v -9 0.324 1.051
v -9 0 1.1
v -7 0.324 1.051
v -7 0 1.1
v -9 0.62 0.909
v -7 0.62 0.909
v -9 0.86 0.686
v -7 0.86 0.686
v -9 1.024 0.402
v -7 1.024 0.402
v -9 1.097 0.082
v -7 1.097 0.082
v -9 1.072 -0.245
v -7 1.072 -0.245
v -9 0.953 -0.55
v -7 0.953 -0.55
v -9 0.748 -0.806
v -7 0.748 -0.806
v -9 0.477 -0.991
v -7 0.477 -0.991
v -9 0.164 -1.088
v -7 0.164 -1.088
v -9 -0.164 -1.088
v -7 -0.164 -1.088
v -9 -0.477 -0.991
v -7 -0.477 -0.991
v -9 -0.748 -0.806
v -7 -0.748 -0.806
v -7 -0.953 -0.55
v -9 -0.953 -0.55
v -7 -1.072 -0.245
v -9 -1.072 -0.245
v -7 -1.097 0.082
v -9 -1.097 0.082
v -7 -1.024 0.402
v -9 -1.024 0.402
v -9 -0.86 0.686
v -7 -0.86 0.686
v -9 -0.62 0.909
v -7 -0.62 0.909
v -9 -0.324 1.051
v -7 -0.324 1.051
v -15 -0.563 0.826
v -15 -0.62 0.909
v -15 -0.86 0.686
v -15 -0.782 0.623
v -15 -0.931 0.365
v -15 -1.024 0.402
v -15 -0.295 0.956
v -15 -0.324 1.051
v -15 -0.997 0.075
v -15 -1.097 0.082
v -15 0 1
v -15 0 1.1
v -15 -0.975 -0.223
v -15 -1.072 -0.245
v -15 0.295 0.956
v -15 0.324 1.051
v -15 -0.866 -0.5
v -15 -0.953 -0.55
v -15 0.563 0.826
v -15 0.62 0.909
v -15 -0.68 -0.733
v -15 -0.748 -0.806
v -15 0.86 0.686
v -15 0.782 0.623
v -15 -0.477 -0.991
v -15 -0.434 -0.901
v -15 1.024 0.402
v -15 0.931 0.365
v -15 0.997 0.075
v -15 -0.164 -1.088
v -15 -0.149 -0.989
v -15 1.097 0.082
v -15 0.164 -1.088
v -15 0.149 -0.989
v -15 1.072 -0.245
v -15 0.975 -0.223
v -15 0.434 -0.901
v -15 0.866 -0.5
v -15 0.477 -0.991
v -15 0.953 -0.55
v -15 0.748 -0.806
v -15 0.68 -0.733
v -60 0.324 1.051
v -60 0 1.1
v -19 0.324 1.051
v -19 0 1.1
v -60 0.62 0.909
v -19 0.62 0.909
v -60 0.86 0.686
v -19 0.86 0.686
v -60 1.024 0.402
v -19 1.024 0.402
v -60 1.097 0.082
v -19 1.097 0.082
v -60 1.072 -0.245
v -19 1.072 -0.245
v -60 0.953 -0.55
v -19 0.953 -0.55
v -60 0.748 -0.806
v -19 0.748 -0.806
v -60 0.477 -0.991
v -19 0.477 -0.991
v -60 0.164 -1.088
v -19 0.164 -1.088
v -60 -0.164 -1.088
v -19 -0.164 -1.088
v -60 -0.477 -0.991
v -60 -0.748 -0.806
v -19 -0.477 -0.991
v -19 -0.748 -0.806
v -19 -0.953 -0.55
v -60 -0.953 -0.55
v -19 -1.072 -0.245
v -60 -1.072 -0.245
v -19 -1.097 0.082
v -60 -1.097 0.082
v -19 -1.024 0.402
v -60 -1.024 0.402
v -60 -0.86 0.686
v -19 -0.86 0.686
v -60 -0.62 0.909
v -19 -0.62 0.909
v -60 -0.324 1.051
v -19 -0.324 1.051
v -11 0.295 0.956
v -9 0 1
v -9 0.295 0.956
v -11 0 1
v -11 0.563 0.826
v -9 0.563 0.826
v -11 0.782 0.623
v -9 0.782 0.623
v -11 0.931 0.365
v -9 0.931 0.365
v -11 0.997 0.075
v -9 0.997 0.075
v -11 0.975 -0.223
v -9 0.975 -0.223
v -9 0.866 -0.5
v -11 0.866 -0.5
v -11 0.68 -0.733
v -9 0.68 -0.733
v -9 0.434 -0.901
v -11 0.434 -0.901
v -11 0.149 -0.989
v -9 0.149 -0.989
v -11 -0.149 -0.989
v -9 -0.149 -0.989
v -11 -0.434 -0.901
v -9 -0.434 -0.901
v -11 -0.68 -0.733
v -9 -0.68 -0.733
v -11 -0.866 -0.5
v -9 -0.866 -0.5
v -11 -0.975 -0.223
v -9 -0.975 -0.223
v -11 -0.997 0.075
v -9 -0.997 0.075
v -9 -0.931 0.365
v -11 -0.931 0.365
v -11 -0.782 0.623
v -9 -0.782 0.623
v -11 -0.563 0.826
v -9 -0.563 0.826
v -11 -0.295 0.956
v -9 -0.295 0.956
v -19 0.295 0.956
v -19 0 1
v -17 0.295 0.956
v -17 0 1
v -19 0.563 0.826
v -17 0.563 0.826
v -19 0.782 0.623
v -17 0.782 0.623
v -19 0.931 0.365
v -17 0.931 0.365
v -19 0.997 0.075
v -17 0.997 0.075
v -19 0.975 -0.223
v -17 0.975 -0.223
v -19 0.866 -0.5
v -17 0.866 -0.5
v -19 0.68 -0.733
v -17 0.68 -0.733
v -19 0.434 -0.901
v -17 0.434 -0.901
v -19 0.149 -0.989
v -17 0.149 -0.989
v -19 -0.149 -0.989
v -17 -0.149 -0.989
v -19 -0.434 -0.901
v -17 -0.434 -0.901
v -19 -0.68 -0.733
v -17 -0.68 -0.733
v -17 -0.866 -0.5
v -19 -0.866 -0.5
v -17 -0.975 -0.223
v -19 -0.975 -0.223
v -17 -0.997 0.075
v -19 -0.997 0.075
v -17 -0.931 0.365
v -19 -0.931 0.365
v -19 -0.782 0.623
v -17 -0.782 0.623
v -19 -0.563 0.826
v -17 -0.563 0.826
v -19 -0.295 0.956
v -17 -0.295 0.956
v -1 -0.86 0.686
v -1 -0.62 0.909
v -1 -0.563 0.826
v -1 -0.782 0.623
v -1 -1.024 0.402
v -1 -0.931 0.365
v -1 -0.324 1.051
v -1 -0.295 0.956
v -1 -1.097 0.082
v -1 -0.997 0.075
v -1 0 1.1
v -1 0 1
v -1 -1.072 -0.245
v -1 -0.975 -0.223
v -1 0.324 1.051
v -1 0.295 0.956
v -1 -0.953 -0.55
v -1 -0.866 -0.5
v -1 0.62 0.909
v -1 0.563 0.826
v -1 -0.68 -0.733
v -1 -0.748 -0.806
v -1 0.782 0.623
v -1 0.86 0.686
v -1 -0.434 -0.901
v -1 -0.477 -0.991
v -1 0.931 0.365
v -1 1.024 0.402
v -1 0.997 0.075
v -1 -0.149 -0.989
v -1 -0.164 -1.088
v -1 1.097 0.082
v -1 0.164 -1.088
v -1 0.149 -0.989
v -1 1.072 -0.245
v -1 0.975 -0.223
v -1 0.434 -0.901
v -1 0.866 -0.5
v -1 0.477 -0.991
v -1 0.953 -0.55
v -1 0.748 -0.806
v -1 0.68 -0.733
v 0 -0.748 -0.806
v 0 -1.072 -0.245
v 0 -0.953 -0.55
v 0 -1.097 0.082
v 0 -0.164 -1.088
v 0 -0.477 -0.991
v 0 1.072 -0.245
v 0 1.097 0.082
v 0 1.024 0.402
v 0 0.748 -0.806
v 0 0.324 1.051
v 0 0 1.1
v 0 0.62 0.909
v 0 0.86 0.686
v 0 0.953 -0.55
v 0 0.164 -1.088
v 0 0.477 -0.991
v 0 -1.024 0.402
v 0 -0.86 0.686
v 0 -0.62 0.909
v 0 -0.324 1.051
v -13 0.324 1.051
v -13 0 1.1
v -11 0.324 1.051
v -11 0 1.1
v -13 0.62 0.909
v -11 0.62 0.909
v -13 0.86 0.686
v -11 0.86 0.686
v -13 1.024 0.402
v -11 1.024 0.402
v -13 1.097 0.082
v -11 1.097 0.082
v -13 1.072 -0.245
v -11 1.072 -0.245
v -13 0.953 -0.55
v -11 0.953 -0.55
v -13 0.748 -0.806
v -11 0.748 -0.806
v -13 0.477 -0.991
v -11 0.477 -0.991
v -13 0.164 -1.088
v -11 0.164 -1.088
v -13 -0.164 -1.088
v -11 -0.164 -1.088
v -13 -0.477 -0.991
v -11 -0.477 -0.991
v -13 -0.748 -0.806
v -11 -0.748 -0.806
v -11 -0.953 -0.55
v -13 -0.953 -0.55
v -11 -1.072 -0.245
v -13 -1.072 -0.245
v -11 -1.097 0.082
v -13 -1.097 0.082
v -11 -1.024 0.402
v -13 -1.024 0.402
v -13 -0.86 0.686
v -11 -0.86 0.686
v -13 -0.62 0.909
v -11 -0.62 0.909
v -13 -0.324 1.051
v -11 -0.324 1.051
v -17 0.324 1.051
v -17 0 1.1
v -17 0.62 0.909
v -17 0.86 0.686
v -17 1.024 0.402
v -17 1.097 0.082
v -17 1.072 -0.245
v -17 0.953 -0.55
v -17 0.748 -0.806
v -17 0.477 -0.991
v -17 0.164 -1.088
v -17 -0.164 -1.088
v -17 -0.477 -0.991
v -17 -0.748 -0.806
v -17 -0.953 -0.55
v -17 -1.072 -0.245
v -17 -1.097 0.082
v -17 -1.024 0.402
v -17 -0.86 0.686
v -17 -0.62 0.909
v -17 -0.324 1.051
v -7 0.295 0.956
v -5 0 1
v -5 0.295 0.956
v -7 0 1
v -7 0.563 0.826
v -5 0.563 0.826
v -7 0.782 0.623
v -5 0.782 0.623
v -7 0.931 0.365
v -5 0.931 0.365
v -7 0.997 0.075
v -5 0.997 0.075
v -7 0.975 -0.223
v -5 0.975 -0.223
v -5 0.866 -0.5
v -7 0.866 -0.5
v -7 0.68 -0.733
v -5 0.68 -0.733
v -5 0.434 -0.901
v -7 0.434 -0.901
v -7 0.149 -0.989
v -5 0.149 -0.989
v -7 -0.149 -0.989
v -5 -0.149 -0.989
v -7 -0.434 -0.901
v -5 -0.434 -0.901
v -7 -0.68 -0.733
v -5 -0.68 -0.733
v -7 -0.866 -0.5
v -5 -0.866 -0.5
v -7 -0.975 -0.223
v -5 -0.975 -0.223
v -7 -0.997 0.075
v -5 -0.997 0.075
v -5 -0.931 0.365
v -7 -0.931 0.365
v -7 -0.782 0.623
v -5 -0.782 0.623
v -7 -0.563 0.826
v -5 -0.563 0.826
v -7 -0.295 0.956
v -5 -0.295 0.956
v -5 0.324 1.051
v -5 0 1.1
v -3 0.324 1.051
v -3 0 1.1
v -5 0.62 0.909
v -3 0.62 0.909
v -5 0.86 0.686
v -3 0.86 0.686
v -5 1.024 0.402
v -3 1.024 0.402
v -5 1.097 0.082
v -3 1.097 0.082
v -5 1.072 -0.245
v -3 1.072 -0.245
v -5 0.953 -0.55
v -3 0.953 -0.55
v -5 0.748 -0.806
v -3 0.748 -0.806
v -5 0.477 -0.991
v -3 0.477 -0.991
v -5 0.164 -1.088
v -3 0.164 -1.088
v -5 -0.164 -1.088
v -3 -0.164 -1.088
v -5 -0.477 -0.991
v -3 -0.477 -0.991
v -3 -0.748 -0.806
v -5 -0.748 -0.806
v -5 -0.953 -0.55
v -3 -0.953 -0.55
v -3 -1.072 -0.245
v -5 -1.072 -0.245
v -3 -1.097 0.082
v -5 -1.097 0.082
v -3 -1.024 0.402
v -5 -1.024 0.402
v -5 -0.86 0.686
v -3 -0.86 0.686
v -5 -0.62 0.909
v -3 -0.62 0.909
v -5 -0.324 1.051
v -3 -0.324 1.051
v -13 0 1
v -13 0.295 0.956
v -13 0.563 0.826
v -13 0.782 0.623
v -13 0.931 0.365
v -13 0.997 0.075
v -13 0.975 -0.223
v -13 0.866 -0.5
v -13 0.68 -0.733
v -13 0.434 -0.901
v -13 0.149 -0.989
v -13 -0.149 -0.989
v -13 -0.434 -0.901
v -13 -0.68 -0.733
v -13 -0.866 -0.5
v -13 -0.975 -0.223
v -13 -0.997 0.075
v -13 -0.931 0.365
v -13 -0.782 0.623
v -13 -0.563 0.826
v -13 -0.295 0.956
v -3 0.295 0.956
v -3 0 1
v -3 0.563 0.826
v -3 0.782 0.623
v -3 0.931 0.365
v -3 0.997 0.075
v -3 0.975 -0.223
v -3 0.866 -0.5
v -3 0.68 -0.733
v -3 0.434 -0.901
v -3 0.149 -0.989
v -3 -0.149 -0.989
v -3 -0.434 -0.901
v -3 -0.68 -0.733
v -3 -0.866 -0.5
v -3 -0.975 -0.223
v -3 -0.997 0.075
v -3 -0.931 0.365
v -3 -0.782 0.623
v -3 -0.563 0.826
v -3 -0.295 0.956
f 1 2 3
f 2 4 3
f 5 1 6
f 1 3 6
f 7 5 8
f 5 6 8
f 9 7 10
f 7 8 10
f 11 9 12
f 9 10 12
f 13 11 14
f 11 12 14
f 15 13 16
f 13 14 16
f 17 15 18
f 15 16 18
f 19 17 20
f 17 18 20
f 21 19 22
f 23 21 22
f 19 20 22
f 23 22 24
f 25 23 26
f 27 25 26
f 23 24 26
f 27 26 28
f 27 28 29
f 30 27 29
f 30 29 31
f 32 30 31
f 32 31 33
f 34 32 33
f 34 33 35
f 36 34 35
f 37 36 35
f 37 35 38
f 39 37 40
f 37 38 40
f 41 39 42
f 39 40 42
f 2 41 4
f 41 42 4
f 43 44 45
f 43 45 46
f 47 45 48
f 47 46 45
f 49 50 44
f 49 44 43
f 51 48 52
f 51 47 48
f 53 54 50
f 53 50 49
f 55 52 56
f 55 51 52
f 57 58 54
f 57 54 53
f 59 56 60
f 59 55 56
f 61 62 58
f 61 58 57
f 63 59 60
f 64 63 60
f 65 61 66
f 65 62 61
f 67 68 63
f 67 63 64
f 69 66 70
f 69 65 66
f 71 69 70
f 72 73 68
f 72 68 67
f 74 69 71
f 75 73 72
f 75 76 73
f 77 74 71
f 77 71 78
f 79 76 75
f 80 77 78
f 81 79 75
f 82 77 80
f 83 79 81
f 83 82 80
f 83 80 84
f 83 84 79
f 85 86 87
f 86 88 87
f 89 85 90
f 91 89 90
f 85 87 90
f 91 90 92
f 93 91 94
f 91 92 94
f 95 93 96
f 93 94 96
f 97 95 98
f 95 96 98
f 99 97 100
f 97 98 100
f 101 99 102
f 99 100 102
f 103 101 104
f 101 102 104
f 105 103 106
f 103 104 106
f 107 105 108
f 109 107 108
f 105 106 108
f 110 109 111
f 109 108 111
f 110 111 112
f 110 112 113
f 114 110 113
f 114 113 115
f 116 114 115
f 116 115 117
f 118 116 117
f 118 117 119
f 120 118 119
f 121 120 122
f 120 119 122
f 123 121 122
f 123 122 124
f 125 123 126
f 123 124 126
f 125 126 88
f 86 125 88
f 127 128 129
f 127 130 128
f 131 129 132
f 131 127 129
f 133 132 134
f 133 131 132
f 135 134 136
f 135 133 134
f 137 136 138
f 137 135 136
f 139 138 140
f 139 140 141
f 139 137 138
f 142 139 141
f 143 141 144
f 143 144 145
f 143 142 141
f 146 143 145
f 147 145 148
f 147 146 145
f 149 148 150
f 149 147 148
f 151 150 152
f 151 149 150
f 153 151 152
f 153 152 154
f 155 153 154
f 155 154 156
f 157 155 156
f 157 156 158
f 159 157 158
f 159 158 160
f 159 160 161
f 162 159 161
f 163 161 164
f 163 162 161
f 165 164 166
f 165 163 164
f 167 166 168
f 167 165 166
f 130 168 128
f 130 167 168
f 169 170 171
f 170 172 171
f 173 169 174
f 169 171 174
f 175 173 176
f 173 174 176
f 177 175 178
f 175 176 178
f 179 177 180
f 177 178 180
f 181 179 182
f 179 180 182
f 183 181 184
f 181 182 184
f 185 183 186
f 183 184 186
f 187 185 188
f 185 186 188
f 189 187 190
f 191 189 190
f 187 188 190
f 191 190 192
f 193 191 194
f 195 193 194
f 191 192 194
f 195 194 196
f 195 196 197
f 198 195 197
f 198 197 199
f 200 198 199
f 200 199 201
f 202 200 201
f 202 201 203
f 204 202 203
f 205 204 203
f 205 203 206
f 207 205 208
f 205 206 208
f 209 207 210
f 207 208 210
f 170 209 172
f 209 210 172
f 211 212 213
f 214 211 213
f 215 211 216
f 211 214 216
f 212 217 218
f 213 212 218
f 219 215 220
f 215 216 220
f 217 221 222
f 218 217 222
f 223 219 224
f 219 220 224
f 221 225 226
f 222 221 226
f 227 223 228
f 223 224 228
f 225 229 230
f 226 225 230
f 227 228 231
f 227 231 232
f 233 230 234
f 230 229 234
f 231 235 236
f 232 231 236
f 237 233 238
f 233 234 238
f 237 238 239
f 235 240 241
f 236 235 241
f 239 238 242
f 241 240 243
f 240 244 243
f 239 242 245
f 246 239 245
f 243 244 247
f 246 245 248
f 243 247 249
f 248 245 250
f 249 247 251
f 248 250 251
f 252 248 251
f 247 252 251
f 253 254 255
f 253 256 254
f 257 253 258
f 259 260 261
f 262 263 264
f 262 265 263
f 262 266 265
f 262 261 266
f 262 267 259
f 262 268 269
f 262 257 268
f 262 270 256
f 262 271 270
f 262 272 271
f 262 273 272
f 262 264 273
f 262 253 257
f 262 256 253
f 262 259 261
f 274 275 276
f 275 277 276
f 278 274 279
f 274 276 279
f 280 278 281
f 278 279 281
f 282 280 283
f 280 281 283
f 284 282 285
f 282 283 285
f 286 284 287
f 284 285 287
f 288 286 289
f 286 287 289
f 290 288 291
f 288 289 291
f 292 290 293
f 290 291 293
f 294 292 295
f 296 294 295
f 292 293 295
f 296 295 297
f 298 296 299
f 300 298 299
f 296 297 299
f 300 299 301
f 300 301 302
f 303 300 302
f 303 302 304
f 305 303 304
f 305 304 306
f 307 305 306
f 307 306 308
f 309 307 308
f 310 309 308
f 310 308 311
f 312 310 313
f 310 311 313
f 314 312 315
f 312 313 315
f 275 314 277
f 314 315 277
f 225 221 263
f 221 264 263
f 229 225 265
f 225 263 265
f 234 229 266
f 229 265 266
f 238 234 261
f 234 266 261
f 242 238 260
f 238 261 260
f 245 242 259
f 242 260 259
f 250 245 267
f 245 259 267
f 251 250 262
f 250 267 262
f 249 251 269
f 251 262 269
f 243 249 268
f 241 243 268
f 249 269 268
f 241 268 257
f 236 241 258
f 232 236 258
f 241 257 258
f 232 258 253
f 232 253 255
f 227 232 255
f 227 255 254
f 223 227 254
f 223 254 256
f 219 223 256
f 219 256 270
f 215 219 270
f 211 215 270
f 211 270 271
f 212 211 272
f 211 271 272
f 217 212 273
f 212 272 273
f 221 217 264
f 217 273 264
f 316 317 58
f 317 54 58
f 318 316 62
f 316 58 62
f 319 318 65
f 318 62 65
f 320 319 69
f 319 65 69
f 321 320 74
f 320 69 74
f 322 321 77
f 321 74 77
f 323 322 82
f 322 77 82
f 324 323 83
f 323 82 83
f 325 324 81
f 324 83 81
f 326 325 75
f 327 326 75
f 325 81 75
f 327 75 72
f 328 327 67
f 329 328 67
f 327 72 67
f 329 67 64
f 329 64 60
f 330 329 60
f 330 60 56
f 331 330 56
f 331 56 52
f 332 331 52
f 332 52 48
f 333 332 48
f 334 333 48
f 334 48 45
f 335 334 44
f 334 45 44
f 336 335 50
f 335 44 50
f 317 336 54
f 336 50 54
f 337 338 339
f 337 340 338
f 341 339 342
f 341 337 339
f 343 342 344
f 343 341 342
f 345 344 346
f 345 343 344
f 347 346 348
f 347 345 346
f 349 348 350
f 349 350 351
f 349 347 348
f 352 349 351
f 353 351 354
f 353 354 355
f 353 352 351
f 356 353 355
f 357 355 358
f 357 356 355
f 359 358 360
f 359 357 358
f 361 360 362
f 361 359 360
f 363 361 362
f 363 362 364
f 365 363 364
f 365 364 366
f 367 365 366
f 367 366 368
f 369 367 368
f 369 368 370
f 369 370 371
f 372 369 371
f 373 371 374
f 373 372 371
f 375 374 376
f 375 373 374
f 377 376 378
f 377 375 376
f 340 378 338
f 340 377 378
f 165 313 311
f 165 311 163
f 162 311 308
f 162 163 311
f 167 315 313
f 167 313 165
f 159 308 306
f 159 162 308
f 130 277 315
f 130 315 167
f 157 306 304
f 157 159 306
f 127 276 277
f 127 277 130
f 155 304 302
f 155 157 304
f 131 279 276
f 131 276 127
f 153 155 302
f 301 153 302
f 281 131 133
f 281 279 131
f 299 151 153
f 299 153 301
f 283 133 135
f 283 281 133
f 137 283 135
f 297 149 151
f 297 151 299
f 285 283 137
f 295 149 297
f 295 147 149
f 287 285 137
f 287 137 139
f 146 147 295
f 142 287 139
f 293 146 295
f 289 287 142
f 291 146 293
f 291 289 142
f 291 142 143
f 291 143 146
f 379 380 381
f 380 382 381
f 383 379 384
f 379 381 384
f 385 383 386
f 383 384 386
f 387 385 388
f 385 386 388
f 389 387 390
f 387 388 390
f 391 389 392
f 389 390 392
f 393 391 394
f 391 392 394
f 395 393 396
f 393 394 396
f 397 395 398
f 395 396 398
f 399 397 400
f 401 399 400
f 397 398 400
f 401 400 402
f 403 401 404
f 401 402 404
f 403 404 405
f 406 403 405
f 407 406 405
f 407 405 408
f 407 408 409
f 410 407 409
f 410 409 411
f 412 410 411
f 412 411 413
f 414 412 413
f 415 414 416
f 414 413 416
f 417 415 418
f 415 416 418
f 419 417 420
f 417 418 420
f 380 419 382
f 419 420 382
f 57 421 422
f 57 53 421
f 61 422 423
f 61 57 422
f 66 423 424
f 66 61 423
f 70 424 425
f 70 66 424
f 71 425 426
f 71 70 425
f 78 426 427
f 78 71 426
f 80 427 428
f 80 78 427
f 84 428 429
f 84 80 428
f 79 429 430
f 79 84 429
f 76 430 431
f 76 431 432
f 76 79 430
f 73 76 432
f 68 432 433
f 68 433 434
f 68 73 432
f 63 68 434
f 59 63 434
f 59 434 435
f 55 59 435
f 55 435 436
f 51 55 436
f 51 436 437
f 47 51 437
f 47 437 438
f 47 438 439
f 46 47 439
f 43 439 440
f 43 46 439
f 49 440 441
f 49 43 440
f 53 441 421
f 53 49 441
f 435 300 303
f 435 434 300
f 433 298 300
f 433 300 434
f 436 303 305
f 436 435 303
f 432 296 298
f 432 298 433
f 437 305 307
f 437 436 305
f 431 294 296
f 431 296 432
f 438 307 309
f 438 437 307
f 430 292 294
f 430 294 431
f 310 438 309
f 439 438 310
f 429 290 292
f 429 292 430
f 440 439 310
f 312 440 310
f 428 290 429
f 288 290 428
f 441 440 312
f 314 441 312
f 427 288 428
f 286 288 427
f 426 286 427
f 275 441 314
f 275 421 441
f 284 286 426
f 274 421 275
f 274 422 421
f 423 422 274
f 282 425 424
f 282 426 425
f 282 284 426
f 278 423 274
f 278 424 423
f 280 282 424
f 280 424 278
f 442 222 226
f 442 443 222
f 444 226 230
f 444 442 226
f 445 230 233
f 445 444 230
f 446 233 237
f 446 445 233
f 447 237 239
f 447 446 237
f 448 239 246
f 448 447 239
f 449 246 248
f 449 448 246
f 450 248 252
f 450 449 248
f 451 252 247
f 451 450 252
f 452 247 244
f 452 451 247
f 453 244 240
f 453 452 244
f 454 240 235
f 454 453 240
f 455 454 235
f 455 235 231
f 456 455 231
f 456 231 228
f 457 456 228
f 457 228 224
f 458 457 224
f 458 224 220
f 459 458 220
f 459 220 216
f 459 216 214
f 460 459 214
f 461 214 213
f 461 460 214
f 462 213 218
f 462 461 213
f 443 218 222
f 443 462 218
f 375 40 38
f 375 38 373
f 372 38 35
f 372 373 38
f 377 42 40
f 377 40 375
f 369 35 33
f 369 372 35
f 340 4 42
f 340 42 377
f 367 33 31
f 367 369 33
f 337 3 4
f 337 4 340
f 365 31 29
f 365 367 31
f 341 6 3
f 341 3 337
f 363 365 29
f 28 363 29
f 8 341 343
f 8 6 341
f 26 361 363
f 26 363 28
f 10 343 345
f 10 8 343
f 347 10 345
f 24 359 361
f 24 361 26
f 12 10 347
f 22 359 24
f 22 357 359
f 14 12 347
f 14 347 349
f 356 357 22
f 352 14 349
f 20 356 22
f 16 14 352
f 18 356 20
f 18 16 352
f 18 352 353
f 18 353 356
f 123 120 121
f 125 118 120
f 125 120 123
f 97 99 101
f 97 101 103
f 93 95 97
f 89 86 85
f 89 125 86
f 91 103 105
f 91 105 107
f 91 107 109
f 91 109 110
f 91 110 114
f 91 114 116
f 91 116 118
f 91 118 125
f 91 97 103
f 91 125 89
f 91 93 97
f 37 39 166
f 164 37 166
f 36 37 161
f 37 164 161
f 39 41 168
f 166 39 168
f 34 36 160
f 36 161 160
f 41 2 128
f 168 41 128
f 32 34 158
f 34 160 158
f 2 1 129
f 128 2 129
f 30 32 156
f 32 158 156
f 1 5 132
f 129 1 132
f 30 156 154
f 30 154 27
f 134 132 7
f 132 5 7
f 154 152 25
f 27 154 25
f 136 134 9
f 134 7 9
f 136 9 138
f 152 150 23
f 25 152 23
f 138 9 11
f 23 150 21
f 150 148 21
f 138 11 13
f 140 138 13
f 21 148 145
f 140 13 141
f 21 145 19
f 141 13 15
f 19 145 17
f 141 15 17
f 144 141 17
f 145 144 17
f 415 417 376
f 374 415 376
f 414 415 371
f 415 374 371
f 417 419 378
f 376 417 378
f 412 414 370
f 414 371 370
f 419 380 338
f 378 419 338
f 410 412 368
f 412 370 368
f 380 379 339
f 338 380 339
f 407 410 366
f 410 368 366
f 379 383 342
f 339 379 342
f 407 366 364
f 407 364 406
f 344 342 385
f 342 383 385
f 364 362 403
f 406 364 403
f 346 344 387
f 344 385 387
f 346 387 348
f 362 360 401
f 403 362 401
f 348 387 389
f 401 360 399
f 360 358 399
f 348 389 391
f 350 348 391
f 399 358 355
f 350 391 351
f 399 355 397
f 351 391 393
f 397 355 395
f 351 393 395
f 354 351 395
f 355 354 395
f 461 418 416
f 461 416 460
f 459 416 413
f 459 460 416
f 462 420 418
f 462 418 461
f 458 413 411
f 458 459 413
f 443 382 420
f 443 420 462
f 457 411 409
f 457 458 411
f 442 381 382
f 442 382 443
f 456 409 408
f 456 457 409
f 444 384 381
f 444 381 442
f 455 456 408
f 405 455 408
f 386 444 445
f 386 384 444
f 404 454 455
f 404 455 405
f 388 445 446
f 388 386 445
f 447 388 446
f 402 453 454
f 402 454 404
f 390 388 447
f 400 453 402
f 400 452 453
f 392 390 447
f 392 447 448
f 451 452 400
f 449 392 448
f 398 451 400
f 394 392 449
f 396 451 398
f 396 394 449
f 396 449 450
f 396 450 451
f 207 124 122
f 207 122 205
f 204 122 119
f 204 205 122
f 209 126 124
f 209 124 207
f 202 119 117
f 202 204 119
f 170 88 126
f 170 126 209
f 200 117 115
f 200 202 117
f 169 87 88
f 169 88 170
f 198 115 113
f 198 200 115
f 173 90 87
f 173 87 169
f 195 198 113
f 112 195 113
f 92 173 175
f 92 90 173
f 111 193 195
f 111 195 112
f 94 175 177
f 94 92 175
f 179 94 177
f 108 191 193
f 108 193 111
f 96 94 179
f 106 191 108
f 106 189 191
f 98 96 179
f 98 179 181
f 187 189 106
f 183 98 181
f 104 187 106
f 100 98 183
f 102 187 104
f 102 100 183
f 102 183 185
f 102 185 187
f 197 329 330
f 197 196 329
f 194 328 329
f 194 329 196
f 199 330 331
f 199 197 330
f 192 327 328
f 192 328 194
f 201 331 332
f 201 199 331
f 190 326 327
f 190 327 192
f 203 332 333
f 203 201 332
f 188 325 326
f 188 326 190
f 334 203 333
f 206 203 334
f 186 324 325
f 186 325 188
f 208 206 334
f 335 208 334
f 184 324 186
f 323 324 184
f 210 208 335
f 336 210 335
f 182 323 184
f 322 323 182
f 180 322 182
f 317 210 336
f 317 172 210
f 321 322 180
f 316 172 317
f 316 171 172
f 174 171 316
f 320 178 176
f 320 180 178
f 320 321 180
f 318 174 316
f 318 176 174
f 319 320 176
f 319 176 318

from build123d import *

# Parameters (mm, degrees)
F0_W     = 6
F0_H     = 0.1
F0_H_2   = 1
F0_W_2   = 2
F0_W_3   = 1
F2_DEPTH = 10
F3_DEPTH = 10
F4_DEPTH = 15


with BuildPart() as f1:
    # F0 (on Front) → F1 (revolve)
    with BuildSketch(Plane.XZ):
        with Locations((-22, 1.05)):
            Rectangle(F0_W, F0_H)
        with Locations((-22, 0.5)):
            Rectangle(F0_W, F0_H_2)
        with Locations((-12, 0.5)):
            Rectangle(F0_W_2, F0_H_2)
        with Locations((-12, 1.05)):
            Rectangle(F0_W_2, F0_H)
        with Locations((-10, 0.5)):
            Rectangle(F0_W_2, F0_H_2)
        with Locations((-8, 0.5)):
            Rectangle(F0_W_2, F0_H_2)
        with Locations((-8, 1.05)):
            Rectangle(F0_W_2, F0_H)
        with Locations((-6, 0.5)):
            Rectangle(F0_W_2, F0_H_2)
        with Locations((-4, 0.5)):
            Rectangle(F0_W_2, F0_H_2)
        with Locations((-4, 1.05)):
            Rectangle(F0_W_2, F0_H)
        with Locations((-2, 0.5)):
            Rectangle(F0_W_2, F0_H_2)
        with Locations((-0.5, 0.5)):
            Rectangle(F0_W_3, F0_H_2)
        with Locations((-0.5, 1.05)):
            Rectangle(F0_W_3, F0_H)
        with Locations((-14, 0.5)):
            Rectangle(F0_W_2, F0_H_2)
        with Locations((-16, 0.5)):
            Rectangle(F0_W_2, F0_H_2)
        with Locations((-16, 1.05)):
            Rectangle(F0_W_2, F0_H)
        with Locations((-18, 0.5)):
            Rectangle(F0_W_2, F0_H_2)
    revolve(axis=Axis((-12.5, 0, 0), (-1, 0, 0)))

    # F2 (add): a face of the model
    f2_faces = [f1.faces().sort_by_distance(p)[0] for p in [
        (-25, 0, 0),
    ]]
    extrude(f2_faces, amount=F2_DEPTH)

    # F3 (add): a face of the model
    f3_faces = [f1.faces().sort_by_distance(p)[0] for p in [
        (-35, 0, 0),
    ]]
    extrude(f3_faces, amount=F3_DEPTH)

    # F4 (add): a face of the model
    f4_faces = [f1.faces().sort_by_distance(p)[0] for p in [
        (-45, 0, 0),
    ]]
    extrude(f4_faces, amount=F4_DEPTH)


solid = f1.part
